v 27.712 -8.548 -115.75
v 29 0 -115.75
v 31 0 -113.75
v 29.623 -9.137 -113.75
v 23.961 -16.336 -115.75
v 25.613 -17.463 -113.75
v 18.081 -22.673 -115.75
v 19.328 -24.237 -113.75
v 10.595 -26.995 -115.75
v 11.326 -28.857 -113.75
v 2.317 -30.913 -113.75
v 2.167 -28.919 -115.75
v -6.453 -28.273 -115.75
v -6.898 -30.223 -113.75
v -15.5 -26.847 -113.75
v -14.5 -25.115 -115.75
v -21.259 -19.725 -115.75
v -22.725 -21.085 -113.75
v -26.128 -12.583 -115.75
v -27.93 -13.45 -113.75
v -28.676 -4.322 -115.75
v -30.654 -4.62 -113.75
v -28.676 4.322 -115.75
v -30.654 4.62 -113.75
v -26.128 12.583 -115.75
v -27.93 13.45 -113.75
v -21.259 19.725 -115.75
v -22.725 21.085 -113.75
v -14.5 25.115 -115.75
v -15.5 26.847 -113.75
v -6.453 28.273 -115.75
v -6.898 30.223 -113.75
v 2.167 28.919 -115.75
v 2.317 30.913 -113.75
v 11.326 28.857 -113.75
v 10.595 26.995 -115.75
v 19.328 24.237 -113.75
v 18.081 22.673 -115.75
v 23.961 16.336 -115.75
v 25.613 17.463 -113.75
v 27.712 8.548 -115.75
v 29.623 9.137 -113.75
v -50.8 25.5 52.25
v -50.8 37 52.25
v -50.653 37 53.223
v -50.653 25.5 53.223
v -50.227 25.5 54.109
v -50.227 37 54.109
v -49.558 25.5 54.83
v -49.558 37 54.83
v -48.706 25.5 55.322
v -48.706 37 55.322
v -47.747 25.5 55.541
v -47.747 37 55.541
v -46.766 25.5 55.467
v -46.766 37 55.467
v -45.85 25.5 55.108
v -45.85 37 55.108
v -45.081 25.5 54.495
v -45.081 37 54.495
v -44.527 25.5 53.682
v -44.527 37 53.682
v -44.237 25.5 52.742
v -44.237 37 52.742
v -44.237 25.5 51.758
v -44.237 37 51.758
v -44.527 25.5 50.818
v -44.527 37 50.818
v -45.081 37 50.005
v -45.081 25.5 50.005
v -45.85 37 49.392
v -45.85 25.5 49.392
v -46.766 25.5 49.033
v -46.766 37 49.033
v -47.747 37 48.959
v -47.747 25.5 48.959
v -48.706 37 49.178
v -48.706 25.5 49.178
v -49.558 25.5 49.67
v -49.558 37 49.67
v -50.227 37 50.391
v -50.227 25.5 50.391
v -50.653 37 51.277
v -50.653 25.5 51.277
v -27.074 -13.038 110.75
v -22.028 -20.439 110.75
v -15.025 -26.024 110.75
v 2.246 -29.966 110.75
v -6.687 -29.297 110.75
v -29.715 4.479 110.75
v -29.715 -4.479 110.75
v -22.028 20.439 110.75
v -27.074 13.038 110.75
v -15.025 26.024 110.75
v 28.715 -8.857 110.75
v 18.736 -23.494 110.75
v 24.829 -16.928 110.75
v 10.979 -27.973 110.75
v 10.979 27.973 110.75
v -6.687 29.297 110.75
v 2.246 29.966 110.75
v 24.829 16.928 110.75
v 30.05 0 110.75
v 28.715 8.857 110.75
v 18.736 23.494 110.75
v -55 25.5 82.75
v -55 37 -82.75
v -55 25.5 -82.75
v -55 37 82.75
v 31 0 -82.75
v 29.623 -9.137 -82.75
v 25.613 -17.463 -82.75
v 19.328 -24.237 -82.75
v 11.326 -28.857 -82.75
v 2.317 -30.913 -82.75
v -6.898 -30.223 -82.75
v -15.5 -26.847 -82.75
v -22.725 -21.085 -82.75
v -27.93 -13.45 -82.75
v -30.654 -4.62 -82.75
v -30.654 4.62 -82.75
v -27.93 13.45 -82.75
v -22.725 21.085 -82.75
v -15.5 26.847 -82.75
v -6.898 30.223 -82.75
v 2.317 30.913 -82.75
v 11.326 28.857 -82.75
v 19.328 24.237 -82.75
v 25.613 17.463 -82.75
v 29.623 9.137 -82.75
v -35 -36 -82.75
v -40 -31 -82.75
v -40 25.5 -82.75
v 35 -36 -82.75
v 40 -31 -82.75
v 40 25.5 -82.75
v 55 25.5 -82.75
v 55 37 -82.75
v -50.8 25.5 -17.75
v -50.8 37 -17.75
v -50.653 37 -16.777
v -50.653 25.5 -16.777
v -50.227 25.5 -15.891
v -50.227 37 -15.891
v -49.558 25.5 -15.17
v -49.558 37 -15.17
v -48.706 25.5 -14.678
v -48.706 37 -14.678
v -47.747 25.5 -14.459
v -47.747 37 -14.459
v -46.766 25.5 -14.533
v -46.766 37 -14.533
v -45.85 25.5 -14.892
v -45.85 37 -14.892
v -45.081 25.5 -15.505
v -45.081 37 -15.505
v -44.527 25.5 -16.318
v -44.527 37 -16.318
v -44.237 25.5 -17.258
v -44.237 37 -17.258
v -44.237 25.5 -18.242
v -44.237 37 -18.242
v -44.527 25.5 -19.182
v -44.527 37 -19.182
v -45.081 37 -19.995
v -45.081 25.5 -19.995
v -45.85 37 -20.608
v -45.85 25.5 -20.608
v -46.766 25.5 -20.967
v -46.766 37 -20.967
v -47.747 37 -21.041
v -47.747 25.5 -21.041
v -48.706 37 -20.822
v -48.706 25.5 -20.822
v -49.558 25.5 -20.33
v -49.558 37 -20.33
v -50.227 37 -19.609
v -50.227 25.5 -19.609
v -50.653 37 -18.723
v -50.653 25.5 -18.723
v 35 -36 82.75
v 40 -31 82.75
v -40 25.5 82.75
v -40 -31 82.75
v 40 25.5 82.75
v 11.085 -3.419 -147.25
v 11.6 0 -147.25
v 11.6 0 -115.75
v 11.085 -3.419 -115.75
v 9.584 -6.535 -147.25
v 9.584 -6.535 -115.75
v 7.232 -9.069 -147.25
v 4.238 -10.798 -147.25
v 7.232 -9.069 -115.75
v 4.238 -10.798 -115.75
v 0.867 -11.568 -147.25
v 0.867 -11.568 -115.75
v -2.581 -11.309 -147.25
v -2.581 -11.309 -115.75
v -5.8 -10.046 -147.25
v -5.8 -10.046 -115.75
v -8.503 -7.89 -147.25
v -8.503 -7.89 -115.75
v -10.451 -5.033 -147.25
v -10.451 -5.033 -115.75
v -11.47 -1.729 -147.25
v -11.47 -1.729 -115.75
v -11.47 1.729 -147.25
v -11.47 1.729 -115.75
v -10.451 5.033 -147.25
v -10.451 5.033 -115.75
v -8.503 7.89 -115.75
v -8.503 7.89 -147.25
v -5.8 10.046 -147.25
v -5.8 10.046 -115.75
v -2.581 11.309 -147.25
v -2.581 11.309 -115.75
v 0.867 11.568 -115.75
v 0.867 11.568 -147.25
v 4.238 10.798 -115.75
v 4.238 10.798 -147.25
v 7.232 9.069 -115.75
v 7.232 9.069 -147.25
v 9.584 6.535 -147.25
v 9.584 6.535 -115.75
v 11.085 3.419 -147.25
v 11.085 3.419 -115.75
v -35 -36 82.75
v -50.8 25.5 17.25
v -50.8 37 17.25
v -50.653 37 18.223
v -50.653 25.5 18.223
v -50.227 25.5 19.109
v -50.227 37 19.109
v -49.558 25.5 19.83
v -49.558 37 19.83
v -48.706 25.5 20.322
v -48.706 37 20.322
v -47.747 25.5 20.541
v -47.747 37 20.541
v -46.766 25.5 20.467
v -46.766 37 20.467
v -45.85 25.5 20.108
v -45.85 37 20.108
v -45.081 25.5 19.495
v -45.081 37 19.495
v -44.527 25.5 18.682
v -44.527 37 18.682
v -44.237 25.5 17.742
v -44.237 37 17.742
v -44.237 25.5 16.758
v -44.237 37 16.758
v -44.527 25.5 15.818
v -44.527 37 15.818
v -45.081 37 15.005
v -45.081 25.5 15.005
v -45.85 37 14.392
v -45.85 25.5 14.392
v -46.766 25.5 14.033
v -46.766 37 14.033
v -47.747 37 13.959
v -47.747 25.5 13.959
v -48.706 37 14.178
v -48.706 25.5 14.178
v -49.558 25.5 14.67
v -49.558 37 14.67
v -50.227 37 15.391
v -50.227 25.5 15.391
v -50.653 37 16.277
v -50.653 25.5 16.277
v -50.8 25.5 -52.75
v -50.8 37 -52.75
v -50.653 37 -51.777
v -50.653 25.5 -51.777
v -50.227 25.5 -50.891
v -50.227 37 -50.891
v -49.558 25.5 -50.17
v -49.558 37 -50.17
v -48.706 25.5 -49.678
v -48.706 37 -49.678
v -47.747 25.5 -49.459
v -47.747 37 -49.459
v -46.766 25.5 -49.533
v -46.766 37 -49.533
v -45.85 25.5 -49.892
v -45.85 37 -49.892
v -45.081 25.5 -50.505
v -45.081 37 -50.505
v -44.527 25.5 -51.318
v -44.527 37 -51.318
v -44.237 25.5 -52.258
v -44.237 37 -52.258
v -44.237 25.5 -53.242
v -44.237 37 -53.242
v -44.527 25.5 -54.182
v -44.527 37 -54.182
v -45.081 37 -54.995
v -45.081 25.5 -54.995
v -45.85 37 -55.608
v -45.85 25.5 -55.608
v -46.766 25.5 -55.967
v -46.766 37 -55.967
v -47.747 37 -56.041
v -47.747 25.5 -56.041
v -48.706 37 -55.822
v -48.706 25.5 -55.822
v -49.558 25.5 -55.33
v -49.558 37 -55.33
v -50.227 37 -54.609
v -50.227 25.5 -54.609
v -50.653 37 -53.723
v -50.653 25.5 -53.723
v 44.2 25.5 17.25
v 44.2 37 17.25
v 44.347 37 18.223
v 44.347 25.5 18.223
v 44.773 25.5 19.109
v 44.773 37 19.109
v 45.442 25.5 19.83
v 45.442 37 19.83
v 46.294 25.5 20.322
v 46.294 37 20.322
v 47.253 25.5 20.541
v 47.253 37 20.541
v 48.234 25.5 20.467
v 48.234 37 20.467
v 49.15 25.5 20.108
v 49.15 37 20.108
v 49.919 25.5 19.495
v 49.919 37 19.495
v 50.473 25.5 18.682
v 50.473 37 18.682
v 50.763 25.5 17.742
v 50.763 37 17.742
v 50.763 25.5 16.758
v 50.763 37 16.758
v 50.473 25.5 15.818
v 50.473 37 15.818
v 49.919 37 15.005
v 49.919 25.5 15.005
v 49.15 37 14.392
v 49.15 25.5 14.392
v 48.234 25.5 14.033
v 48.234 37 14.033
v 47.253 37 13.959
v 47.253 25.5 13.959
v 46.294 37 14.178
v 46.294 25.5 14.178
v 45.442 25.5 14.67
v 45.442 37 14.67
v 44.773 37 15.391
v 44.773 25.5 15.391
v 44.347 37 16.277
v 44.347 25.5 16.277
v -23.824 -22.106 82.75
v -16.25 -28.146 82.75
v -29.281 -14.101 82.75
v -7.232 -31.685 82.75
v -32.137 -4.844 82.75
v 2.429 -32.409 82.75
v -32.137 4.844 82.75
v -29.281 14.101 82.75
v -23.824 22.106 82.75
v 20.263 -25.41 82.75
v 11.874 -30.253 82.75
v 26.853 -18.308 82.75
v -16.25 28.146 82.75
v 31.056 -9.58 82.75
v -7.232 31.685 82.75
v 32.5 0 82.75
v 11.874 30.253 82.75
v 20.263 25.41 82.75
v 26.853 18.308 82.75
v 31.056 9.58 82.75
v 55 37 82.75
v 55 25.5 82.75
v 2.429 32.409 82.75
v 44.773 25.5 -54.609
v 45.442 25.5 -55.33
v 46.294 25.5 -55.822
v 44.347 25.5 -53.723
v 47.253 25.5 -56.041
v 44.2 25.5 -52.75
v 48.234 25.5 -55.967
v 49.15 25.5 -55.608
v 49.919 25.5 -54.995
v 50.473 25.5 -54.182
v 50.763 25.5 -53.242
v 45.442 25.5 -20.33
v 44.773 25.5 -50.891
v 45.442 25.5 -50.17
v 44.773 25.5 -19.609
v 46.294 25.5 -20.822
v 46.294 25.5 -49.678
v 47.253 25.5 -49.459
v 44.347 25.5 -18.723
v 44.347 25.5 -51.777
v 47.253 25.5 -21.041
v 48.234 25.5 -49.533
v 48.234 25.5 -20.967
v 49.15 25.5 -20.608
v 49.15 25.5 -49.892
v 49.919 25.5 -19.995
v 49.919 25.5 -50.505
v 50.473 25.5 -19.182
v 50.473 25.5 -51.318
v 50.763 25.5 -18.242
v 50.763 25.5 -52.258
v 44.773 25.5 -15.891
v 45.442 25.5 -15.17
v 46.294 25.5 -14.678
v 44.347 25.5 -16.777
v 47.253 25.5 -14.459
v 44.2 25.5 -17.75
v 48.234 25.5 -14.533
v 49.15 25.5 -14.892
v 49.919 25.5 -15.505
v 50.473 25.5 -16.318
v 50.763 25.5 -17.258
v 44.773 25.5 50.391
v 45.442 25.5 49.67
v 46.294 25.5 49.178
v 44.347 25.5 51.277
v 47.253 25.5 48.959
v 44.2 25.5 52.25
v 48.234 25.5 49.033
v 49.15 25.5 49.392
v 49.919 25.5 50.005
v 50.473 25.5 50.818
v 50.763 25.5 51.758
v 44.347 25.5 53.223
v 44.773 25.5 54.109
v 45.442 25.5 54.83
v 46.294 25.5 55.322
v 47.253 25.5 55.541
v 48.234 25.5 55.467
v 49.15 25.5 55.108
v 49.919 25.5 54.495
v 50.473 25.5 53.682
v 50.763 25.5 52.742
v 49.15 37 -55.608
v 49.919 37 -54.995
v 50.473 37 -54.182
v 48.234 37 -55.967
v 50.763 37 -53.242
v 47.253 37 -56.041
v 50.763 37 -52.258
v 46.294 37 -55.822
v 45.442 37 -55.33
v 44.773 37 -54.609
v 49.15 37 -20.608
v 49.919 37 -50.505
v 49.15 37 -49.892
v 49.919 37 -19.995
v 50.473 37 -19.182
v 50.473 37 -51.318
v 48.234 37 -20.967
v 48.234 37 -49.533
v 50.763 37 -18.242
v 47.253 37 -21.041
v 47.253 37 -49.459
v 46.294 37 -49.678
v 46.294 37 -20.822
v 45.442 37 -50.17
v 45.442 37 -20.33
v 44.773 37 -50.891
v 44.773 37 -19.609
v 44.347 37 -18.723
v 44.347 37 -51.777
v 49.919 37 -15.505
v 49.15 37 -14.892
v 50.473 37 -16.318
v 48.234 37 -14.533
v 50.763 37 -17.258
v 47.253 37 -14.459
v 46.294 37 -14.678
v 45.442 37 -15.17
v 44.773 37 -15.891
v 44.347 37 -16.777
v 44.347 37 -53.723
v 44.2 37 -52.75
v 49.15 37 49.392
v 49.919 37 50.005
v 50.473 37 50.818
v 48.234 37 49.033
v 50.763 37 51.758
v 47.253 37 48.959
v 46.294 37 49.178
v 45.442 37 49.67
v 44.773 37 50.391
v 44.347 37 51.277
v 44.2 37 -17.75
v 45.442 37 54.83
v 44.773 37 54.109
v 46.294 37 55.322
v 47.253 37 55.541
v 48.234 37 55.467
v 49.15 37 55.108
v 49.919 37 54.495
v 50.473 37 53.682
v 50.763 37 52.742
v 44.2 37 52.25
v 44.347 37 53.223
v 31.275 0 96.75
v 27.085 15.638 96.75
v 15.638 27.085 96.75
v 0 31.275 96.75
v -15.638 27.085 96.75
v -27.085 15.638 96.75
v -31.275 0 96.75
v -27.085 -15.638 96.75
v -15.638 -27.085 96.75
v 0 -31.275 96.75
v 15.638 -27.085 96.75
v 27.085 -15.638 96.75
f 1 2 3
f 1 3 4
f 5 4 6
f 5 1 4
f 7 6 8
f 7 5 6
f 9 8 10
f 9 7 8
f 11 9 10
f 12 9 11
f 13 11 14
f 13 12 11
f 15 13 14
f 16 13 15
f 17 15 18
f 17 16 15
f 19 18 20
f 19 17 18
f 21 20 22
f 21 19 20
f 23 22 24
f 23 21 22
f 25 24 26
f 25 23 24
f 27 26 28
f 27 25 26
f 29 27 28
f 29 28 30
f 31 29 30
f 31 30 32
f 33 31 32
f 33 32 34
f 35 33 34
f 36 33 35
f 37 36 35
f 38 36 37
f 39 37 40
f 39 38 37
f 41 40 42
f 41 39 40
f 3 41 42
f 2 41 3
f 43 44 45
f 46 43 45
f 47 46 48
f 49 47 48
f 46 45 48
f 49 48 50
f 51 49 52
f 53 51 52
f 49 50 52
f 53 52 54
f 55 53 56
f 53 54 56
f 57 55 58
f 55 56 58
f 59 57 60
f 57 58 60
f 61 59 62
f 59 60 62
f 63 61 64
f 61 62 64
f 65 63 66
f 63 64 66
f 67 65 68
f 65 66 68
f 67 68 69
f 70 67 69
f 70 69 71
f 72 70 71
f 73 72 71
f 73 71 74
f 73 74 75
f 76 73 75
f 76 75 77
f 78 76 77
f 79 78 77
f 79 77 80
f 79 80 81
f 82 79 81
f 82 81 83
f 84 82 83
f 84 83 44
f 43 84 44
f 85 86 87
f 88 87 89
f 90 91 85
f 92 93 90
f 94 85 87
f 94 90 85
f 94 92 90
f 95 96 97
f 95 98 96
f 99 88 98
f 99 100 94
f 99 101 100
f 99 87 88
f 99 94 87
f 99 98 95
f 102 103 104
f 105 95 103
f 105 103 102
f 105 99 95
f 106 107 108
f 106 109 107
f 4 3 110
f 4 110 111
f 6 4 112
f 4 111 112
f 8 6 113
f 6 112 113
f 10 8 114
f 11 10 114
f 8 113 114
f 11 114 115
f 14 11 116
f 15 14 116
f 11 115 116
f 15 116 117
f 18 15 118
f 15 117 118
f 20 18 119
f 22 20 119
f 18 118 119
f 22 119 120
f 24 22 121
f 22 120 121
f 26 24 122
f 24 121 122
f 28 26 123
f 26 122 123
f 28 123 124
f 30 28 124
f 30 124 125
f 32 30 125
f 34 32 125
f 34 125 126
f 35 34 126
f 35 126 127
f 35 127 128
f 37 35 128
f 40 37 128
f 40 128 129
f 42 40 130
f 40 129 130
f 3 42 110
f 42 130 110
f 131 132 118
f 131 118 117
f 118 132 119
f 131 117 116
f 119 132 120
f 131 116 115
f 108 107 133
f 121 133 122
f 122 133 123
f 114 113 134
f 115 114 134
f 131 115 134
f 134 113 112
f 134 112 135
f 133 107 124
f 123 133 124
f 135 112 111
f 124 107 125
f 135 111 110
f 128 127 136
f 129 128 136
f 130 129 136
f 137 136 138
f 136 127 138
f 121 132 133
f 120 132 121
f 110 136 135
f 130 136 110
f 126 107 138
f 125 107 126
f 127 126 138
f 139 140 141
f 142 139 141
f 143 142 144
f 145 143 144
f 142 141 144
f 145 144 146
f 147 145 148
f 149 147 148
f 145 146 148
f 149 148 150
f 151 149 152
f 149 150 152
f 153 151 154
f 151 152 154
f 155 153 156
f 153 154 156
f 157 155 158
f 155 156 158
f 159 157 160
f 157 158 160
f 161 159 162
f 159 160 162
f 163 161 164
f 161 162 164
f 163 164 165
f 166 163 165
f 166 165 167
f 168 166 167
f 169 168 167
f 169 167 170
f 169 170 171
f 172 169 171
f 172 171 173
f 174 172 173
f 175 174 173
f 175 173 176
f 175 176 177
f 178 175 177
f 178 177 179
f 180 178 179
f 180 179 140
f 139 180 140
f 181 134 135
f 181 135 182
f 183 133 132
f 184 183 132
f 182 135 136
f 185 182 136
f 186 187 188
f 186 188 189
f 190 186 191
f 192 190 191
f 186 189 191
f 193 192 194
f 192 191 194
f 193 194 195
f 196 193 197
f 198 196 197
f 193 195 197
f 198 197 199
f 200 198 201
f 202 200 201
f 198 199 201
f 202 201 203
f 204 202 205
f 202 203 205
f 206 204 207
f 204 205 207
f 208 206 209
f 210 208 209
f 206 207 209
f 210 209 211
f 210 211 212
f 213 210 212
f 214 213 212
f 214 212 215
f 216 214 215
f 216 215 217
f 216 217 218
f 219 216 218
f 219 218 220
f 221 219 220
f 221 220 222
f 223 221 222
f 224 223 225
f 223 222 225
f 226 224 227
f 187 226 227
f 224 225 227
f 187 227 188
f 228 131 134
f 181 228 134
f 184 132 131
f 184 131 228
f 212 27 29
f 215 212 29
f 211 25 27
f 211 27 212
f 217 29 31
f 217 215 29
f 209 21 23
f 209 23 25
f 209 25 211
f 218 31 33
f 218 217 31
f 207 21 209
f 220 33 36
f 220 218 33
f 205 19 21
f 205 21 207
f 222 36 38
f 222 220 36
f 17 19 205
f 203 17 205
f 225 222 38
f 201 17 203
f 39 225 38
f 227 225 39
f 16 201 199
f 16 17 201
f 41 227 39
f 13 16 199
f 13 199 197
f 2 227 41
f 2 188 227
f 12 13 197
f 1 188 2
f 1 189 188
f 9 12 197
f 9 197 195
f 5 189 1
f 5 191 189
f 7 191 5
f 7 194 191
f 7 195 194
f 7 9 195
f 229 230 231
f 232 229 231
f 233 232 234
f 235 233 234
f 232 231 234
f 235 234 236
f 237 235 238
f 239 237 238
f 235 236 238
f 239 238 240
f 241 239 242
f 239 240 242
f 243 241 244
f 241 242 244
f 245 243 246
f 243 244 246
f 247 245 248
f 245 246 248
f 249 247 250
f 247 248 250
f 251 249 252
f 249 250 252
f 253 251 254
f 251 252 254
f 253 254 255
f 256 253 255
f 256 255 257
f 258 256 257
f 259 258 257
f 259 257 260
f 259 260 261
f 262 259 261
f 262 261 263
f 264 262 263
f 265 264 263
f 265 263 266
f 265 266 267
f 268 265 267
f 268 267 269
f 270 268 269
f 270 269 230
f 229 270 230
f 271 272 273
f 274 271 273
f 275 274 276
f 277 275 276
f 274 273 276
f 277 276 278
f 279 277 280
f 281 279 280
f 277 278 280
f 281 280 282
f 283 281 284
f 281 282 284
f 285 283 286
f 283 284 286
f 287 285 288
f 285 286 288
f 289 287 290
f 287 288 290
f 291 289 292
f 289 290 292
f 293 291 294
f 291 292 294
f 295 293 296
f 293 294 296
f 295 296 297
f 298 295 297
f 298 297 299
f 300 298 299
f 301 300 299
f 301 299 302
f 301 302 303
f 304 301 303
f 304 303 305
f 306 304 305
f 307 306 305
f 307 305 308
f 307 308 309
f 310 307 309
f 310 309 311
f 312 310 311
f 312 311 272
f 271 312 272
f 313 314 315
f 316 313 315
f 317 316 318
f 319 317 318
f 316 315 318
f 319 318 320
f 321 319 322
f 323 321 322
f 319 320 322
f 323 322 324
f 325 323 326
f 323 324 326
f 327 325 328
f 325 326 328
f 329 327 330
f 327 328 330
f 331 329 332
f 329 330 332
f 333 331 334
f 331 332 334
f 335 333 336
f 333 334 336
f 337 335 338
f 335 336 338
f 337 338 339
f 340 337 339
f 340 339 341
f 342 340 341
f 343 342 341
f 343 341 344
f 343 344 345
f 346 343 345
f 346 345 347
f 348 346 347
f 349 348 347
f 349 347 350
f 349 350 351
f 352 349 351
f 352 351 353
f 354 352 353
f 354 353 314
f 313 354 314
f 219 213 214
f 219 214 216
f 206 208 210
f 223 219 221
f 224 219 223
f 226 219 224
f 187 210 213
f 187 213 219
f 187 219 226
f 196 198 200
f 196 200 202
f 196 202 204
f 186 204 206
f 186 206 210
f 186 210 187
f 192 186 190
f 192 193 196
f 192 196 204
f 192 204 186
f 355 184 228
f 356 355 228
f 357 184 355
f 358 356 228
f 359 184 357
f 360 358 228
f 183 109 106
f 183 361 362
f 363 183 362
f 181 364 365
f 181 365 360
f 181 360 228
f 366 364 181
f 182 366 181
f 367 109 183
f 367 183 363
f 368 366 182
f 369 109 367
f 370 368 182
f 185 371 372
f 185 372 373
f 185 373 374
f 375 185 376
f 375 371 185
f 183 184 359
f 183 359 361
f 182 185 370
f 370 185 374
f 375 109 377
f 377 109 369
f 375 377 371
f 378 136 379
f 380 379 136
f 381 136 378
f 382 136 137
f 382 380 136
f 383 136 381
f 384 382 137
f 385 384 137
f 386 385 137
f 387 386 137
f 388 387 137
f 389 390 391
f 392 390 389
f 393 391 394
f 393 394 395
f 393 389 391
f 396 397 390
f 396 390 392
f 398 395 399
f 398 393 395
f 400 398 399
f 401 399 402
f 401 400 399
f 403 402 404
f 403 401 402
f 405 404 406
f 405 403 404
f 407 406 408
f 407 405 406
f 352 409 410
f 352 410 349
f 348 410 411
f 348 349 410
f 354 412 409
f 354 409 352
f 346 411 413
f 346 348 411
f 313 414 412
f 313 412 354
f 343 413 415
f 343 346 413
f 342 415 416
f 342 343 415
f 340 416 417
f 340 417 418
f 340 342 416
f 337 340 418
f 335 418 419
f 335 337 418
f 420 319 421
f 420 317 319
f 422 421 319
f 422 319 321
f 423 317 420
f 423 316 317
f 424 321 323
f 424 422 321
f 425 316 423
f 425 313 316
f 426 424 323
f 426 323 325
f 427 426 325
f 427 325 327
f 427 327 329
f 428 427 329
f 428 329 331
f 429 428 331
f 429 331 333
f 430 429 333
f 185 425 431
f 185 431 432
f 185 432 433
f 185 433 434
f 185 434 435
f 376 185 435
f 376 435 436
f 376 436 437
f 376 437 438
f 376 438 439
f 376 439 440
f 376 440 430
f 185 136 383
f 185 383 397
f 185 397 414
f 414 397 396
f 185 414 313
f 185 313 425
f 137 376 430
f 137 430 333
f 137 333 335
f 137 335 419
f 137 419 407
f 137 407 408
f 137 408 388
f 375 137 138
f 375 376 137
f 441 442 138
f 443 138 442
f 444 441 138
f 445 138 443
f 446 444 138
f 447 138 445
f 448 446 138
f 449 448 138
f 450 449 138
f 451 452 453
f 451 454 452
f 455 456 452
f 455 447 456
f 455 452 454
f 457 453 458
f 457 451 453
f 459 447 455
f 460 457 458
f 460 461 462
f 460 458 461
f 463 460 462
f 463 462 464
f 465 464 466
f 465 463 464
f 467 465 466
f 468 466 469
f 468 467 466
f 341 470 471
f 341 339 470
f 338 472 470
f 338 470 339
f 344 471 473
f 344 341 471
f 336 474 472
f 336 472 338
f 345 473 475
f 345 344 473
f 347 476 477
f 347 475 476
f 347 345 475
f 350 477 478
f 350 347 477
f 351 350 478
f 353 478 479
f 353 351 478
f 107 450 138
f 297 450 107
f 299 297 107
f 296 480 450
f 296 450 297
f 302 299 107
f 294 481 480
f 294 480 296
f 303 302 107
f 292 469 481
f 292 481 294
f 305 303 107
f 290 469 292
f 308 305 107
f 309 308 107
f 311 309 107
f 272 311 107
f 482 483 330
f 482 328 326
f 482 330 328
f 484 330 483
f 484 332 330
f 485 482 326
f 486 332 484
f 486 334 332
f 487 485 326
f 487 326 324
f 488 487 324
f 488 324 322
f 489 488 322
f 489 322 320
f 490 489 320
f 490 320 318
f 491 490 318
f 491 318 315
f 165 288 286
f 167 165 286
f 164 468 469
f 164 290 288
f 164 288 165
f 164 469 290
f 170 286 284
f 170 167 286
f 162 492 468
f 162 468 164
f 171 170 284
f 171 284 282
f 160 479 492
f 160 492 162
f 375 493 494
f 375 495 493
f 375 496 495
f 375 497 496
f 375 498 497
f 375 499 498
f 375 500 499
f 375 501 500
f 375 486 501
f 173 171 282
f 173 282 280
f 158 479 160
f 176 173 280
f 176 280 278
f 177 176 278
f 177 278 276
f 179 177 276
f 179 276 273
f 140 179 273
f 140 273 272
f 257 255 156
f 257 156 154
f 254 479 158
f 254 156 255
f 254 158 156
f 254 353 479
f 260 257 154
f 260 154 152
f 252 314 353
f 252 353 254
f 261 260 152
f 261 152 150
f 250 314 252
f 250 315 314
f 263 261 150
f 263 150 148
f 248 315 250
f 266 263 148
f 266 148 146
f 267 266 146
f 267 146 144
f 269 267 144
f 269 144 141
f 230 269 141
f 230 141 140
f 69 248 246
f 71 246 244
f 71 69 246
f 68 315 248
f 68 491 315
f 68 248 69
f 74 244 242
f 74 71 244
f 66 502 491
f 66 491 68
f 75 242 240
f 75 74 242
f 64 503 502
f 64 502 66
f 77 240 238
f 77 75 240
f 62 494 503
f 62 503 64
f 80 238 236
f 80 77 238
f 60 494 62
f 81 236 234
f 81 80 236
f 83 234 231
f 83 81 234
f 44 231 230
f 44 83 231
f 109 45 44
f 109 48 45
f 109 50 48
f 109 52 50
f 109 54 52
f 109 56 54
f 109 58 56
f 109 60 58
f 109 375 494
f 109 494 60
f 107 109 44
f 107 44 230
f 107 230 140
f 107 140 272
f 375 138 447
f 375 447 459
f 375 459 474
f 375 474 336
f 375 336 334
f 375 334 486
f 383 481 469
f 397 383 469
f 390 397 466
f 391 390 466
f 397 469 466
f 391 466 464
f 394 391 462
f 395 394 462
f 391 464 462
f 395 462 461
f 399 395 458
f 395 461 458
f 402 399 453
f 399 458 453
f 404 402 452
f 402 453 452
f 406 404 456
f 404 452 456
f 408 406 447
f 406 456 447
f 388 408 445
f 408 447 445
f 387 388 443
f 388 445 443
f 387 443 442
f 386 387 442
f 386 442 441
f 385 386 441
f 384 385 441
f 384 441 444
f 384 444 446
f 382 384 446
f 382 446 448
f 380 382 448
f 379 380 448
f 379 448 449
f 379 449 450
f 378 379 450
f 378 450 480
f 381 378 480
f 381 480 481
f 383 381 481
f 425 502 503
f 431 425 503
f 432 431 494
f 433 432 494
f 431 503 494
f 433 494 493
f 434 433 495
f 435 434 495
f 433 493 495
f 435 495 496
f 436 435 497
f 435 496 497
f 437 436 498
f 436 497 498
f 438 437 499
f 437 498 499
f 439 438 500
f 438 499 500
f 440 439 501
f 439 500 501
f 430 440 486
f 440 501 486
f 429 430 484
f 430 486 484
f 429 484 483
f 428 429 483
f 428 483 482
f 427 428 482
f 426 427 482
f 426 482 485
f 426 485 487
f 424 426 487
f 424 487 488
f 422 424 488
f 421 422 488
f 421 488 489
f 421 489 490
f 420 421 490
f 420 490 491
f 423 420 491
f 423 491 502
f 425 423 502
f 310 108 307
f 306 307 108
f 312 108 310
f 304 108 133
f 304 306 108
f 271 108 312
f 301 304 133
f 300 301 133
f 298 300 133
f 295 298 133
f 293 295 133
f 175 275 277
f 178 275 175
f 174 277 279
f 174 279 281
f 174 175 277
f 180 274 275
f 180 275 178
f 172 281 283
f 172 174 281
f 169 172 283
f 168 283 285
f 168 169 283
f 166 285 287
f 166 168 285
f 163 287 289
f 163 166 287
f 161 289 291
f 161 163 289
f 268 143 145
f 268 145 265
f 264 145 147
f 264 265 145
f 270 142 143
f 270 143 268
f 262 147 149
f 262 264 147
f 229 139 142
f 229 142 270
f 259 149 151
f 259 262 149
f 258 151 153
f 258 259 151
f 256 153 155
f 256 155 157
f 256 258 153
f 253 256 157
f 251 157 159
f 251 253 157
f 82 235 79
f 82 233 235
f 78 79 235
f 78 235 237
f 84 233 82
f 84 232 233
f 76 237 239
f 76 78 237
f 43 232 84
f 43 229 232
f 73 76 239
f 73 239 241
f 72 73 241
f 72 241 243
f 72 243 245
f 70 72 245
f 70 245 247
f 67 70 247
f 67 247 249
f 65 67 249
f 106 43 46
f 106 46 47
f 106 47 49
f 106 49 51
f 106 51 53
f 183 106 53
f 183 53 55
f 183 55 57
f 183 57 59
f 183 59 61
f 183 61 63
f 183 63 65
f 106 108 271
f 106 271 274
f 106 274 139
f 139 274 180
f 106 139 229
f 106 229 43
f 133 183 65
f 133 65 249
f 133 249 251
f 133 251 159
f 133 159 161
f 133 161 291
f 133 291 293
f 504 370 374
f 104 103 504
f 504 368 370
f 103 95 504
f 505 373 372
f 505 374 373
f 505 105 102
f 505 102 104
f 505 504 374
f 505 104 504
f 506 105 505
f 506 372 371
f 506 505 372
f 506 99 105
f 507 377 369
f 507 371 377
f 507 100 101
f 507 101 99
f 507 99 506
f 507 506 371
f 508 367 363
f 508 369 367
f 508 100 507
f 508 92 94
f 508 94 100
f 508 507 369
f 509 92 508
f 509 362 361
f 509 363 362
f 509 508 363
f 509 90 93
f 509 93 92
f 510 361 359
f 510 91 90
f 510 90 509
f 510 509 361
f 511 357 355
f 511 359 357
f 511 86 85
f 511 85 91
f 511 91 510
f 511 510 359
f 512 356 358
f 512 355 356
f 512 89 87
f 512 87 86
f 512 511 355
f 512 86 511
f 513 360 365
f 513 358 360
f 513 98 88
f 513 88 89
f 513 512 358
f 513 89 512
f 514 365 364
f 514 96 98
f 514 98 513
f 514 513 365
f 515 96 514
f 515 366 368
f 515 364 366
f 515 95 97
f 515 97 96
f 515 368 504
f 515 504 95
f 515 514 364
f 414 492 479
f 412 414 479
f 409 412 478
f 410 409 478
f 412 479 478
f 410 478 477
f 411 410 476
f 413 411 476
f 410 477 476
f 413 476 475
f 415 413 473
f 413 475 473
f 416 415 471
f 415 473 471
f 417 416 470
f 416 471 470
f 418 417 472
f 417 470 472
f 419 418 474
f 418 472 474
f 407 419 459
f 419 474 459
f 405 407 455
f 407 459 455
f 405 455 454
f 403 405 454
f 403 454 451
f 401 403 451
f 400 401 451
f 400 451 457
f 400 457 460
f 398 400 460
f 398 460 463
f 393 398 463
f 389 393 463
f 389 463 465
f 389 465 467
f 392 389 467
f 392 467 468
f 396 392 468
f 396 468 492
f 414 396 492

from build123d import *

# Parameters (mm, degrees)
F1_DEPTH = 82.75
F2_SIZE  = 5
F3_R     = 31
F4_DEPTH = 33
F5_SIZE  = 2
F6_R     = 11.6
F7_DEPTH = 31.5
F8_R     = 32.5
F9_DEPTH = 28
F9_TAPER = 5
F11_D    = 6.6


with BuildPart() as f1:
    # F0 (on Top) → F1 (new body, symmetric)
    with BuildSketch(Plane.XY):
        Polygon((0, 37), (-55, 37), (-55, 25.5), (-40, 25.5), (-40, -36), (0, -36), (40, -36), (40, 25.5), (55, 25.5), (55, 37), align=None)
    extrude(amount=F1_DEPTH, both=True)

    # F2
    f2_edges = [f1.edges().sort_by_distance(p)[0] for p in [
        (40, -36, 0),
        (-40, -36, 0),
    ]]
    chamfer(f2_edges, length=F2_SIZE)

    # F3 (on face) → F4 (join)
    with BuildSketch(Plane(origin=(0, 0, -82.75), x_dir=(1, 0, 0), z_dir=(0, 0, -1))):
        Circle(F3_R)
    extrude(amount=F4_DEPTH)

    # F5
    f5_edges = [f1.edges().sort_by_distance(p)[0] for p in [
        (-31, 0, -115.75),
    ]]
    chamfer(f5_edges, length=F5_SIZE)

    # F6 (on face) → F7 (join)
    with BuildSketch(Plane(origin=(0, 0, -115.75), x_dir=(1, 0, 0), z_dir=(0, 0, -1))):
        Circle(F6_R)
    extrude(amount=F7_DEPTH)

    # F8 (on face) → F9 (join)
    with BuildSketch(Plane.XY.offset(82.75)):
        Circle(F8_R)
    extrude(amount=F9_DEPTH, taper=F9_TAPER)

    # F11 (through all)
    with Locations(Plane.XZ.offset(-25.5)):
        with Locations((-47.5, 52.25), (-47.5, 17.25), (-47.5, -17.75), (-47.5, -52.75), (47.5, 52.25), (47.5, 17.25), (47.5, -17.75), (47.5, -52.75)):
            Hole(F11_D / 2)


solid = f1.part
